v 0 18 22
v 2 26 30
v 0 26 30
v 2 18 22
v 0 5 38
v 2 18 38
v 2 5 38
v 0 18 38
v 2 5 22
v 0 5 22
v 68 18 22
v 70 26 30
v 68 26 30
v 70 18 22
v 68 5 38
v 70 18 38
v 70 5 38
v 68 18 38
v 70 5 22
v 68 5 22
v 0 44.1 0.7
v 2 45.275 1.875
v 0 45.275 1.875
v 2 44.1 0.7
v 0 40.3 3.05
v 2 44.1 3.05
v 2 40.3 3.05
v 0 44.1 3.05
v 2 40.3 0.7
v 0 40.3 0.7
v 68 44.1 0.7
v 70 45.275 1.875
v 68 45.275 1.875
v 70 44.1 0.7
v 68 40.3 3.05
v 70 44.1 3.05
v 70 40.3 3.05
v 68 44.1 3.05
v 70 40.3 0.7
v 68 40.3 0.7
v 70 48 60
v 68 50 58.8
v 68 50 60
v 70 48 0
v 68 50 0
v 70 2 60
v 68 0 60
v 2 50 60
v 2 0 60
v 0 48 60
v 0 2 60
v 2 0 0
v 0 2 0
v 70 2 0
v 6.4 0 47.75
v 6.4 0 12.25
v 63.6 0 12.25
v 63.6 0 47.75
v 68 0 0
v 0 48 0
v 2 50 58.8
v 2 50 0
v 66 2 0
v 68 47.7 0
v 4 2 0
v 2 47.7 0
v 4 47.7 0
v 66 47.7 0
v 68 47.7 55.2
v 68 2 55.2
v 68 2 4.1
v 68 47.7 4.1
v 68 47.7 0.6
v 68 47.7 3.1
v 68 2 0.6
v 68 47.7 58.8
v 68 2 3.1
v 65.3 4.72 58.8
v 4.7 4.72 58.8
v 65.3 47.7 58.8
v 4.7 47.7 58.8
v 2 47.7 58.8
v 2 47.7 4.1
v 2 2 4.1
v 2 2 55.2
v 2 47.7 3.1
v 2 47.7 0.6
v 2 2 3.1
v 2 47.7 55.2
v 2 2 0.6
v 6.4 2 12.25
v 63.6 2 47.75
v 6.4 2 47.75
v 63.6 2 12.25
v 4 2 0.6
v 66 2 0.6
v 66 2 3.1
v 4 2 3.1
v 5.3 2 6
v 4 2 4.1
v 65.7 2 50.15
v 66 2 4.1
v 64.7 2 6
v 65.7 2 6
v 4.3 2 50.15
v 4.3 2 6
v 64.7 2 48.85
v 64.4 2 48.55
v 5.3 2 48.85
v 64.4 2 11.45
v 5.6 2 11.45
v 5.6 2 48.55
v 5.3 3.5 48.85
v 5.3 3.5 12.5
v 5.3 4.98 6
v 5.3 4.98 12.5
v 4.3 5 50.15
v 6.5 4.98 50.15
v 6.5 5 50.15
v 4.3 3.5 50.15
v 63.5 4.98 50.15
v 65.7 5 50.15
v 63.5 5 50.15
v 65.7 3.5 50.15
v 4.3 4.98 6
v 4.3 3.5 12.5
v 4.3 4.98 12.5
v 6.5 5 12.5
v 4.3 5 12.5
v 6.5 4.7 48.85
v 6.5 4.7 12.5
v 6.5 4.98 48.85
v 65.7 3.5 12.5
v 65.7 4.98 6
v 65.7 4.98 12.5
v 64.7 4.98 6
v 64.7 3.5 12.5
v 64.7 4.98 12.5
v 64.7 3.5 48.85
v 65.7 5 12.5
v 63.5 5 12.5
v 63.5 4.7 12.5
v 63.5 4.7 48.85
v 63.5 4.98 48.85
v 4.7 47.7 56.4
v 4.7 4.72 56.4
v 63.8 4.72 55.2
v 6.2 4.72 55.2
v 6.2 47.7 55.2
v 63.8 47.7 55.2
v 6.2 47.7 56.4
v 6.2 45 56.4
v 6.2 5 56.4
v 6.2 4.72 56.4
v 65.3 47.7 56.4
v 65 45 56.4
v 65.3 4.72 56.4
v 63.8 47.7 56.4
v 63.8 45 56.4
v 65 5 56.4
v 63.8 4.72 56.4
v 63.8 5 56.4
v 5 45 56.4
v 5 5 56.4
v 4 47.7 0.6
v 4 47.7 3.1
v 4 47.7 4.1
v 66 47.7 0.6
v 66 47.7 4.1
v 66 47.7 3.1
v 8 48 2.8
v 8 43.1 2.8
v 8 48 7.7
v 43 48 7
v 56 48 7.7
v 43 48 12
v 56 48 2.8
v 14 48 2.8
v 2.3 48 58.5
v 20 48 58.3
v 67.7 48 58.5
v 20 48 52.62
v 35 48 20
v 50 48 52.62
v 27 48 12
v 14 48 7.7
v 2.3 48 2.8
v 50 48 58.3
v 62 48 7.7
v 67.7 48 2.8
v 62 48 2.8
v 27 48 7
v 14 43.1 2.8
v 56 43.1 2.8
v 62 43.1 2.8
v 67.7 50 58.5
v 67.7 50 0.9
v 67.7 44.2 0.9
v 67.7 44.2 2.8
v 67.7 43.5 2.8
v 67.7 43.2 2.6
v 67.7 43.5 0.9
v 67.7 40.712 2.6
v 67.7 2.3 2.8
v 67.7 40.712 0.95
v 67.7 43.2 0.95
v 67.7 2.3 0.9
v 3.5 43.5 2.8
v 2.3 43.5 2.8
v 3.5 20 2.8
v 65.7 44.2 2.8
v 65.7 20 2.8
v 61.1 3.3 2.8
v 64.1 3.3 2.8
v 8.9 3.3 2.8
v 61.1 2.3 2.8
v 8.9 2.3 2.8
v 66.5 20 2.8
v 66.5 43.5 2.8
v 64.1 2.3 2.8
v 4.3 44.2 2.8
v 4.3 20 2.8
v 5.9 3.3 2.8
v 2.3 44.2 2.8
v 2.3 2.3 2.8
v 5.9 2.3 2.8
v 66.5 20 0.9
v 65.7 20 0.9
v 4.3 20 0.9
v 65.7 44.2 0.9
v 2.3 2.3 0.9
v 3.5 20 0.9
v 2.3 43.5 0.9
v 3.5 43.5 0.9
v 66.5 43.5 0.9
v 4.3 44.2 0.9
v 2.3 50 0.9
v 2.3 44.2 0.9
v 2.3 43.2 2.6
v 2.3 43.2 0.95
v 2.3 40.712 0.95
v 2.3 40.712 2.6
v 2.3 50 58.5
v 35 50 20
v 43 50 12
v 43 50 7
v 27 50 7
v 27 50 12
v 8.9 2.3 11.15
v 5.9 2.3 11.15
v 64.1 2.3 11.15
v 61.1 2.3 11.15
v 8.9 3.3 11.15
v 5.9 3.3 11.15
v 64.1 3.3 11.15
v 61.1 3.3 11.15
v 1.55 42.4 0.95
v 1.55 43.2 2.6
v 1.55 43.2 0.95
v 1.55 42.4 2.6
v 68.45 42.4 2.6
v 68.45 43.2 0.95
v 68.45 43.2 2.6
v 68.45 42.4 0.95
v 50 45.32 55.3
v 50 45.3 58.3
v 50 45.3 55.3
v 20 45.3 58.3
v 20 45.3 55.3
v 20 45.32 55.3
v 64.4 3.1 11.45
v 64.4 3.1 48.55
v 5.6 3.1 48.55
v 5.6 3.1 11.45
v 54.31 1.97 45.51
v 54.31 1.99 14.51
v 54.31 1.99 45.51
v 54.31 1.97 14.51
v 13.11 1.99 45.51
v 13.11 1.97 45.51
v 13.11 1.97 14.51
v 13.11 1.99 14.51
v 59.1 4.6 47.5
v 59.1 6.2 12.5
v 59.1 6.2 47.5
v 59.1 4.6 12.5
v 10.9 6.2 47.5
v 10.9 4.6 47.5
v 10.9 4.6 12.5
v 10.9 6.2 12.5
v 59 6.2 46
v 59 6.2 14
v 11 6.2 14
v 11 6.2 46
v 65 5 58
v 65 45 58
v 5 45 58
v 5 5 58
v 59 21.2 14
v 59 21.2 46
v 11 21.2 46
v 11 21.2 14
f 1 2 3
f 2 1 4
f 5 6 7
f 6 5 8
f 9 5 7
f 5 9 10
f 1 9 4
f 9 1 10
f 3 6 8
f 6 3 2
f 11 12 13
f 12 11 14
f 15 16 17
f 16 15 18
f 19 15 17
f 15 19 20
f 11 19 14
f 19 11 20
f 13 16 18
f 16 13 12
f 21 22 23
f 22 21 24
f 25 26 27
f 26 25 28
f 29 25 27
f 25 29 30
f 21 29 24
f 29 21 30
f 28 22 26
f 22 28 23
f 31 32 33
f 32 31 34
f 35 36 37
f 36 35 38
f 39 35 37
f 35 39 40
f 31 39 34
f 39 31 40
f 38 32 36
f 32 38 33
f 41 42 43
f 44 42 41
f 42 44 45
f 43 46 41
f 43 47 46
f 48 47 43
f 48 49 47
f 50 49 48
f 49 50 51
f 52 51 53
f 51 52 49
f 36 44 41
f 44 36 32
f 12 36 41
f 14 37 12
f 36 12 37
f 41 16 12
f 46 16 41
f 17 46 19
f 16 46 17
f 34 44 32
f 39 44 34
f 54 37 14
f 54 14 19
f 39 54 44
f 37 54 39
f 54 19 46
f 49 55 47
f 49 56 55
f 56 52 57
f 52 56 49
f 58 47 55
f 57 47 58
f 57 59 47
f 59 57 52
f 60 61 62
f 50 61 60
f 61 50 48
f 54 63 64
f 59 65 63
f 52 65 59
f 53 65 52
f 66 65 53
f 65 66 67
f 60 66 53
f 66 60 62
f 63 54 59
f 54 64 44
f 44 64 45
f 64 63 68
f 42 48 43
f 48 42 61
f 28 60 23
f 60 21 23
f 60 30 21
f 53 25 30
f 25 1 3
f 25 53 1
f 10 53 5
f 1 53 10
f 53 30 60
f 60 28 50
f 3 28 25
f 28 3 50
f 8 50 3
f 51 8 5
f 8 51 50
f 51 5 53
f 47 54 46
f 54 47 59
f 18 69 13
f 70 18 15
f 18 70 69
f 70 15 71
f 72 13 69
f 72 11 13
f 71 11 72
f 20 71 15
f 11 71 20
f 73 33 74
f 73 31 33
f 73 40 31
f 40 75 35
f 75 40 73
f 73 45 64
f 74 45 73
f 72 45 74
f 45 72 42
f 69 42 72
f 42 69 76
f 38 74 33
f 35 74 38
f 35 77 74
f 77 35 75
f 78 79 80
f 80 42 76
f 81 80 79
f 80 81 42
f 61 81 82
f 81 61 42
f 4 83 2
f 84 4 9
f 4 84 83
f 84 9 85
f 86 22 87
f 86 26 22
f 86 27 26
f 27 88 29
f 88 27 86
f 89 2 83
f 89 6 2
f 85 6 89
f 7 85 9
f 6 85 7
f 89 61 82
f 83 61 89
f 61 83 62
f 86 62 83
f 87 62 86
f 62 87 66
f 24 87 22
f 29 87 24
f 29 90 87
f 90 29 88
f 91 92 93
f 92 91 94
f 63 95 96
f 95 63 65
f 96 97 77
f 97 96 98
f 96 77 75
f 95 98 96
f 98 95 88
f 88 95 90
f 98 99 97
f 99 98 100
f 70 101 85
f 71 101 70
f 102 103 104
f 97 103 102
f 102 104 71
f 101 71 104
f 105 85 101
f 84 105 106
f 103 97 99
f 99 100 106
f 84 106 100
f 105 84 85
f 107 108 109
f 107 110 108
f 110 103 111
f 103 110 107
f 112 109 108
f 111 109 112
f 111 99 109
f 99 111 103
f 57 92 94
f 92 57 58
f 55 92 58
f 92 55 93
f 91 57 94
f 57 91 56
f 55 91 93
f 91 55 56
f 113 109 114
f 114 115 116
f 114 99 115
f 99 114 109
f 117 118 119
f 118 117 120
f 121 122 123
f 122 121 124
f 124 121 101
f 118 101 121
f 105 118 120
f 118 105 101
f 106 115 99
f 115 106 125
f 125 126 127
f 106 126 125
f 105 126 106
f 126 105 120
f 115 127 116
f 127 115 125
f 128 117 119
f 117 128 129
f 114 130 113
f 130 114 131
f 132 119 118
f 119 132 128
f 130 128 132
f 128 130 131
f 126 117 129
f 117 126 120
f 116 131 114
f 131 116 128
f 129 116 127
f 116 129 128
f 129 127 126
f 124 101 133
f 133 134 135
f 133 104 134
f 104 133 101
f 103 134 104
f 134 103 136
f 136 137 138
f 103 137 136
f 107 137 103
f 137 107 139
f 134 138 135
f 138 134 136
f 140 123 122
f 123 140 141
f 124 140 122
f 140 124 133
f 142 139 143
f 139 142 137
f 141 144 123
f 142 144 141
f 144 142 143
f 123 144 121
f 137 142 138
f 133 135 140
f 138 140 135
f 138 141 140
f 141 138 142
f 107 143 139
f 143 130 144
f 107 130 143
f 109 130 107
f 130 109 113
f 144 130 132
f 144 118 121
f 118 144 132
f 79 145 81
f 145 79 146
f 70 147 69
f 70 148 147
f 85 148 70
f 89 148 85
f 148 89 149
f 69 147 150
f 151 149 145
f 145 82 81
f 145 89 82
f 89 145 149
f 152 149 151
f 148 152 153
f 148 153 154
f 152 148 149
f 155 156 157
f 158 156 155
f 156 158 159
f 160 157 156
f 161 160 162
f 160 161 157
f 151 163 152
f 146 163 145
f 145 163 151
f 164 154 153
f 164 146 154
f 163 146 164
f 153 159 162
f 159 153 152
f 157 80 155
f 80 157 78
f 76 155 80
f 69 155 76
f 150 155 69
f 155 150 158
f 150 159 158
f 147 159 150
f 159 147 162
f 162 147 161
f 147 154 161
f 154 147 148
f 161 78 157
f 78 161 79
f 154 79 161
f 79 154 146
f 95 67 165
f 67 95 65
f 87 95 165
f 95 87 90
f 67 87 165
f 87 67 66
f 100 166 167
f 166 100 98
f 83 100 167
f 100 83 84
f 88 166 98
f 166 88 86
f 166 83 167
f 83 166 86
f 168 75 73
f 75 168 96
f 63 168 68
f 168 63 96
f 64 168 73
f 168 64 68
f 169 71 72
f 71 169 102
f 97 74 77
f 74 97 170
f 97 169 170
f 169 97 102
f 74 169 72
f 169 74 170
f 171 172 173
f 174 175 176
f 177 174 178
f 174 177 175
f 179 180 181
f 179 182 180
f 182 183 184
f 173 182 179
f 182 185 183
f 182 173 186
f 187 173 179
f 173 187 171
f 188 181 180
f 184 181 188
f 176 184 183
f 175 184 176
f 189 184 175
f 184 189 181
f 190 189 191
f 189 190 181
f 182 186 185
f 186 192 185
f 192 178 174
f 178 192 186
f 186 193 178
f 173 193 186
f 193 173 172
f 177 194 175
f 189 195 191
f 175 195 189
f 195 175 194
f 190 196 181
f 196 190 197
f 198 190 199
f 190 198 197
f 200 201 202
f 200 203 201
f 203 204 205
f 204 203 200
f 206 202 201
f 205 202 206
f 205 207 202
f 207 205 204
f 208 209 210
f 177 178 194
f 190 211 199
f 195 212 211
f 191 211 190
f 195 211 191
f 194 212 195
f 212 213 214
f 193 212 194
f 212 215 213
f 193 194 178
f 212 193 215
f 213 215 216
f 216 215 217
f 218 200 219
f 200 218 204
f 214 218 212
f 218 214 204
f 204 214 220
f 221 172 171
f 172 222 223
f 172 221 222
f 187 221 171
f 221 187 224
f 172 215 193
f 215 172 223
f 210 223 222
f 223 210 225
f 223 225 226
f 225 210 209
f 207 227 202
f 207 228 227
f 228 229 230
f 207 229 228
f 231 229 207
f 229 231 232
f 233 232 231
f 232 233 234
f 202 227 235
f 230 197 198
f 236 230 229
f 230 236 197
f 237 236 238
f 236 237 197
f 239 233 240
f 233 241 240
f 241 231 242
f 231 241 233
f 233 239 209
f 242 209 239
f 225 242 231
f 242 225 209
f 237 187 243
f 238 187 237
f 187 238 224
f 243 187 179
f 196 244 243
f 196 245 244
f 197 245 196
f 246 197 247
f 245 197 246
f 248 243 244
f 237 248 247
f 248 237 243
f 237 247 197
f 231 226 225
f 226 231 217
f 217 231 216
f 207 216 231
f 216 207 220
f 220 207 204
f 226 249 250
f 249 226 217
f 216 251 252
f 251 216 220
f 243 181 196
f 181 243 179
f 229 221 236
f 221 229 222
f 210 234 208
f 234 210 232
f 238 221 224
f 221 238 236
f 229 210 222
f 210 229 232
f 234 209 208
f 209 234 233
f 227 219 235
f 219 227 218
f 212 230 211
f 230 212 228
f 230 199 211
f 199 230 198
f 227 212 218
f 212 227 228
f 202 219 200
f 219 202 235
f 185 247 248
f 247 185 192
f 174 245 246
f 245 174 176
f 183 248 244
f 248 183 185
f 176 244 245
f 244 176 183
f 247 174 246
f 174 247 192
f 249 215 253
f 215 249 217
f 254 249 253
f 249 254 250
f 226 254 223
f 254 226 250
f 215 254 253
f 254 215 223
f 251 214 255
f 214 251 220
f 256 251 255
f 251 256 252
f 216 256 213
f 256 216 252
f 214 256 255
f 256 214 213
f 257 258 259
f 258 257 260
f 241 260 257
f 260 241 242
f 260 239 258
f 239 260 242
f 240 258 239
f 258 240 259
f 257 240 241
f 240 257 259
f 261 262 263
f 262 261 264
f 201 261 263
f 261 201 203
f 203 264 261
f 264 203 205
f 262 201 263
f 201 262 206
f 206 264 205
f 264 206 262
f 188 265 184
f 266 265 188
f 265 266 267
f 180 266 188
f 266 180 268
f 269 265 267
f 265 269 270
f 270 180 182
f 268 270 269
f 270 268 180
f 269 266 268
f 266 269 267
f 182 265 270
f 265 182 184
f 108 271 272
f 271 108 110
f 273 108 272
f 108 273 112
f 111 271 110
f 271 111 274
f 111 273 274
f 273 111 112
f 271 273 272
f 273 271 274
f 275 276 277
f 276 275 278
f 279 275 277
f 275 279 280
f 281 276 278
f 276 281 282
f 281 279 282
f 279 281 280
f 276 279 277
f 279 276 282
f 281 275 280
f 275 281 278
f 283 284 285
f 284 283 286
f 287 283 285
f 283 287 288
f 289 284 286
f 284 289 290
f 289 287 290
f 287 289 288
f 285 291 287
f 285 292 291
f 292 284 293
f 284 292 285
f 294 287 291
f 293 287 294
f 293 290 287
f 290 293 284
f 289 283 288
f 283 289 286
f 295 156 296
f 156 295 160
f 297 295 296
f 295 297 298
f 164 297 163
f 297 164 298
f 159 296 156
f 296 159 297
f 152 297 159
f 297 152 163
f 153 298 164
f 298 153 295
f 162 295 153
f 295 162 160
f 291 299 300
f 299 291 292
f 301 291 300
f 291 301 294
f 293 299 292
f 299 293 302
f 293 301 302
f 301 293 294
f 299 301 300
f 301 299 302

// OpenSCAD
// NFC jukebox enclosure rB - front-face-down print orientation, millimetres.
// Source: Waveshare ESP32-S3-Touch-LCD-2 dimension drawing.
// RC522 nominal 60x40 PCB; actual thickness/component keepouts need fit check.
// Coordinates: X width, Y front->rear, Z height. Front is Y=0.
// Use: openscad -D 'part="body"' -o body.stl jukebox.scad
part = "assembly"; // body, drawer, assembly, exploded, interference
$fn = 40;
W=70; D=50; H=60;
wall=2;
glass_w=58.8; glass_h=37.1; glass_t=1.1;
glass_x=(W-glass_w)/2; glass_z=(H-glass_h)/2;
glass_y=wall;
glass_gap=0.4;
rail_rear=glass_y+glass_t+glass_gap;
rc_w=60; rc_d=40; rc_t=1.6;
rc_x=(W-rc_w)/2; rc_y=(D-rc_d)/2;
rc_z=56.4;
clearance=0.3;
eps=0.02;

module box(x,y,z,dx,dy,dz){translate([x,y,z])cube([dx,dy,dz]);}

module shell(){
  difference(){
    // Chamfers grow at 45 degrees when printing with the front on the bed.
    linear_extrude(height=H)polygon([[2,0],[W-2,0],[W,2],[W,D-2],
      [W-2,D],[2,D],[0,D-2],[0,2]]);
    // Open bottom and rear, roof 1.2 mm. Side/front walls 2 mm.
    box(wall,wall,-eps,W-2*wall,D,H-1.2+eps);
    // Front bezel overlaps glass by 0.8 mm each edge.
    box(glass_x+0.8,-eps,glass_z+0.8,glass_w-1.6,wall+2*eps,glass_h-1.6);
    // Side service windows accommodate either mirrored USB orientation.
    for(x=[-eps,W-wall-eps])translate([x,0,0])rotate([90,0,90])
      linear_extrude(height=wall+2*eps)
        polygon([[5,22],[18,22],[26,30],[18,38],[5,38]]);
    // Release openings for the two drawer detents, accessible from outside.
    for(x=[-eps,W-wall-eps])translate([x,0,0])rotate([90,0,90])
      linear_extrude(height=wall+2*eps)
        polygon([[40.3,0.7],[44.1,0.7],[45.275,1.875],[44.1,3.05],[40.3,3.05]]);
  }
}

module display_guides(){
  // Retain only glass margins: rear PCB is narrower and stays unobstructed.
  for(right=[false,true]){
    x=right ? glass_x+glass_w+clearance : glass_x-clearance-1;
    box(x,wall-eps,6,1,3.0,H/2+glass_h/2+clearance-6+1.3);
    // Retaining lips grow 1.2 mm over 1.2 mm of print height (45 degrees).
    // They retain 0.9 mm of each glass margin, leaving the rear PCB clear.
    translate([right ? W : 0,0,glass_z+1.05])scale([right ? -1 : 1,1,1])
      linear_extrude(height=glass_h+clearance+1.3-1.05)
        polygon([[4.3,3.5],[5.3,3.5],[6.5,4.7],[6.5,5],[4.3,5]]);
  }
  // Upper stop contacts the outer glass edge, not active LCD.
  box(glass_x-clearance,wall-eps,glass_z+glass_h+clearance,
      glass_w+2*clearance,rail_rear-wall+1.5,1.3);
}

module rfid_guides(){
  // Board slides in from the open rear, antenna side up, solder joints down.
  // 2.4-mm channel for nominal 1.6-mm PCB. No metal or supports under antenna.
  for(right=[false,true]){
    x=right ? rc_x+rc_w+clearance : wall-eps;
    width=right ? W-wall-x+eps : rc_x-clearance-wall+eps;
    box(x,rc_y-clearance,55.2,width,D-wall-clearance-(rc_y-clearance),H-1.2-55.2+eps);
    ledge_x=right ? rc_x+rc_w-1.2 : wall-eps;
    ledge_w=right ? W-wall-ledge_x+eps : rc_x+1.2-wall+eps;
    box(ledge_x,rc_y-clearance,55.2,ledge_w,D-wall-clearance-(rc_y-clearance),1.2);
  }
  // Root the front stop in the front wall, avoiding a floating first layer.
  box(wall-eps,wall-eps,55.2,W-2*wall+2*eps,rc_y-clearance-wall+2*eps,H-1.2-55.2+eps);
}

module floor_guides(){
  for(right=[false,true]){
    x=right ? W-wall-2 : wall-eps;
    box(x,wall-eps,0,2+eps,D-2*wall-clearance+eps,0.6);
    box(x,wall-eps,3.1,2+eps,D-2*wall-clearance+eps,1.0);
  }
}

module body(){union(){shell();display_guides();rfid_guides();floor_guides();}}

module tooth_left(){
  // 0.45 mm engagement, 24-mm flexible PLA arm, ramp during insertion.
  translate([0,0,0.95])linear_extrude(height=1.65)
    polygon([[2.35,40.6],[1.55,42.4],[1.55,43.2],[2.35,43.2]]);
}

module drawer(){
  union(){
    difference(){
      union(){
        box(2.3,2.3,0.9,W-4.6,D-2.3,1.9);
        box(2.3,48,0.9,W-4.6,2,57.6);
        // Inner corner fillet substitute: 45-degree triangular gussets.
        for(x=[8,56])translate([x,48,2.7])rotate([90,0,90])
          linear_extrude(height=6)polygon([[0,0],[-5,0],[0,5]]);
      }
      // Free a long cantilever on each side, rooted at Y=20.
      box(3.5,20,0.8,0.8,24.2,2.2);
      box(2.1,43.5,0.8,2.2,0.7,2.2);
      box(W-4.3,20,0.8,0.8,24.2,2.2);
      box(W-4.3,43.5,0.8,2.2,0.7,2.2);
      // Grip opening with a 45-degree roof instead of a 16-mm bridge.
      translate([27,50.1,7])rotate([90,0,0])linear_extrude(height=2.2)
        polygon([[0,0],[16,0],[16,5],[8,13],[0,5]]);
    }
    tooth_left();translate([W,0,0])mirror([1,0,0])tooth_left();
    // Drawer supports display glass vertically, with 0.3 mm end clearance.
    for(x=[glass_x+0.3,glass_x+glass_w-3.3])
      box(x,2.3,2.7,3,1.0,glass_z-clearance-2.7);
    // Rear board stop: only its end face, no pressure on PCB surfaces.
    box(20,rc_y+rc_d+clearance,55.3,30,48-(rc_y+rc_d+clearance)+eps,3.0);
    // Grow the overhang outward from the rear wall at 45 degrees.
    translate([20,48,52.6])rotate([90,0,90])linear_extrude(height=30)
      polygon([[eps,0],[eps,2.72],[-2.7,2.72]]);
  }
}

module hardware(){
  color([0.12,0.16,0.19])box(glass_x,glass_y,glass_z,glass_w,glass_t,glass_h);
  color([0.08,0.65,0.64])box(glass_x+7.51,glass_y-0.03,glass_z+3.06,41.2,0.02,31);
  // PCB envelope; actual connector positions are deliberately not asserted.
  color([0.1,0.3,0.6])box((W-48.2)/2,glass_y+glass_t+1.5,(H-35)/2,48.2,1.6,35);
  color([0.08,0.35,0.62])box(rc_x,rc_y,rc_z,rc_w,rc_d,rc_t);
  // Approximate rear electronics keepout, for illustration only.
  color([0.55,0.55,0.55,0.3])box(11,6.2,14,48,15,32);
}

if(part=="body") translate([0,H,0])rotate([90,0,0])body();
else if(part=="drawer")translate([0,0,-0.9])drawer();
else if(part=="interference")intersection(){body();drawer();}
else if(part=="travel_check")intersection(){
  body();
  union()for(dy=[0:0.5:50])translate([0,dy,0])difference(){
    drawer();
    // The flexible detents intentionally interfere while the drawer slides.
    box(0,39,0,2.3,6,4);box(W-2.3,39,0,2.3,6,4);
  }
}
else if(part=="exploded"){
  color([0.76,0.80,0.83,0.5])body();hardware();
  color([0.94,0.55,0.22])translate([0,35,-10])drawer();
} else {
  color([0.76,0.80,0.83,0.65])body();
  color([0.3,0.36,0.42])drawer();hardware();
}
